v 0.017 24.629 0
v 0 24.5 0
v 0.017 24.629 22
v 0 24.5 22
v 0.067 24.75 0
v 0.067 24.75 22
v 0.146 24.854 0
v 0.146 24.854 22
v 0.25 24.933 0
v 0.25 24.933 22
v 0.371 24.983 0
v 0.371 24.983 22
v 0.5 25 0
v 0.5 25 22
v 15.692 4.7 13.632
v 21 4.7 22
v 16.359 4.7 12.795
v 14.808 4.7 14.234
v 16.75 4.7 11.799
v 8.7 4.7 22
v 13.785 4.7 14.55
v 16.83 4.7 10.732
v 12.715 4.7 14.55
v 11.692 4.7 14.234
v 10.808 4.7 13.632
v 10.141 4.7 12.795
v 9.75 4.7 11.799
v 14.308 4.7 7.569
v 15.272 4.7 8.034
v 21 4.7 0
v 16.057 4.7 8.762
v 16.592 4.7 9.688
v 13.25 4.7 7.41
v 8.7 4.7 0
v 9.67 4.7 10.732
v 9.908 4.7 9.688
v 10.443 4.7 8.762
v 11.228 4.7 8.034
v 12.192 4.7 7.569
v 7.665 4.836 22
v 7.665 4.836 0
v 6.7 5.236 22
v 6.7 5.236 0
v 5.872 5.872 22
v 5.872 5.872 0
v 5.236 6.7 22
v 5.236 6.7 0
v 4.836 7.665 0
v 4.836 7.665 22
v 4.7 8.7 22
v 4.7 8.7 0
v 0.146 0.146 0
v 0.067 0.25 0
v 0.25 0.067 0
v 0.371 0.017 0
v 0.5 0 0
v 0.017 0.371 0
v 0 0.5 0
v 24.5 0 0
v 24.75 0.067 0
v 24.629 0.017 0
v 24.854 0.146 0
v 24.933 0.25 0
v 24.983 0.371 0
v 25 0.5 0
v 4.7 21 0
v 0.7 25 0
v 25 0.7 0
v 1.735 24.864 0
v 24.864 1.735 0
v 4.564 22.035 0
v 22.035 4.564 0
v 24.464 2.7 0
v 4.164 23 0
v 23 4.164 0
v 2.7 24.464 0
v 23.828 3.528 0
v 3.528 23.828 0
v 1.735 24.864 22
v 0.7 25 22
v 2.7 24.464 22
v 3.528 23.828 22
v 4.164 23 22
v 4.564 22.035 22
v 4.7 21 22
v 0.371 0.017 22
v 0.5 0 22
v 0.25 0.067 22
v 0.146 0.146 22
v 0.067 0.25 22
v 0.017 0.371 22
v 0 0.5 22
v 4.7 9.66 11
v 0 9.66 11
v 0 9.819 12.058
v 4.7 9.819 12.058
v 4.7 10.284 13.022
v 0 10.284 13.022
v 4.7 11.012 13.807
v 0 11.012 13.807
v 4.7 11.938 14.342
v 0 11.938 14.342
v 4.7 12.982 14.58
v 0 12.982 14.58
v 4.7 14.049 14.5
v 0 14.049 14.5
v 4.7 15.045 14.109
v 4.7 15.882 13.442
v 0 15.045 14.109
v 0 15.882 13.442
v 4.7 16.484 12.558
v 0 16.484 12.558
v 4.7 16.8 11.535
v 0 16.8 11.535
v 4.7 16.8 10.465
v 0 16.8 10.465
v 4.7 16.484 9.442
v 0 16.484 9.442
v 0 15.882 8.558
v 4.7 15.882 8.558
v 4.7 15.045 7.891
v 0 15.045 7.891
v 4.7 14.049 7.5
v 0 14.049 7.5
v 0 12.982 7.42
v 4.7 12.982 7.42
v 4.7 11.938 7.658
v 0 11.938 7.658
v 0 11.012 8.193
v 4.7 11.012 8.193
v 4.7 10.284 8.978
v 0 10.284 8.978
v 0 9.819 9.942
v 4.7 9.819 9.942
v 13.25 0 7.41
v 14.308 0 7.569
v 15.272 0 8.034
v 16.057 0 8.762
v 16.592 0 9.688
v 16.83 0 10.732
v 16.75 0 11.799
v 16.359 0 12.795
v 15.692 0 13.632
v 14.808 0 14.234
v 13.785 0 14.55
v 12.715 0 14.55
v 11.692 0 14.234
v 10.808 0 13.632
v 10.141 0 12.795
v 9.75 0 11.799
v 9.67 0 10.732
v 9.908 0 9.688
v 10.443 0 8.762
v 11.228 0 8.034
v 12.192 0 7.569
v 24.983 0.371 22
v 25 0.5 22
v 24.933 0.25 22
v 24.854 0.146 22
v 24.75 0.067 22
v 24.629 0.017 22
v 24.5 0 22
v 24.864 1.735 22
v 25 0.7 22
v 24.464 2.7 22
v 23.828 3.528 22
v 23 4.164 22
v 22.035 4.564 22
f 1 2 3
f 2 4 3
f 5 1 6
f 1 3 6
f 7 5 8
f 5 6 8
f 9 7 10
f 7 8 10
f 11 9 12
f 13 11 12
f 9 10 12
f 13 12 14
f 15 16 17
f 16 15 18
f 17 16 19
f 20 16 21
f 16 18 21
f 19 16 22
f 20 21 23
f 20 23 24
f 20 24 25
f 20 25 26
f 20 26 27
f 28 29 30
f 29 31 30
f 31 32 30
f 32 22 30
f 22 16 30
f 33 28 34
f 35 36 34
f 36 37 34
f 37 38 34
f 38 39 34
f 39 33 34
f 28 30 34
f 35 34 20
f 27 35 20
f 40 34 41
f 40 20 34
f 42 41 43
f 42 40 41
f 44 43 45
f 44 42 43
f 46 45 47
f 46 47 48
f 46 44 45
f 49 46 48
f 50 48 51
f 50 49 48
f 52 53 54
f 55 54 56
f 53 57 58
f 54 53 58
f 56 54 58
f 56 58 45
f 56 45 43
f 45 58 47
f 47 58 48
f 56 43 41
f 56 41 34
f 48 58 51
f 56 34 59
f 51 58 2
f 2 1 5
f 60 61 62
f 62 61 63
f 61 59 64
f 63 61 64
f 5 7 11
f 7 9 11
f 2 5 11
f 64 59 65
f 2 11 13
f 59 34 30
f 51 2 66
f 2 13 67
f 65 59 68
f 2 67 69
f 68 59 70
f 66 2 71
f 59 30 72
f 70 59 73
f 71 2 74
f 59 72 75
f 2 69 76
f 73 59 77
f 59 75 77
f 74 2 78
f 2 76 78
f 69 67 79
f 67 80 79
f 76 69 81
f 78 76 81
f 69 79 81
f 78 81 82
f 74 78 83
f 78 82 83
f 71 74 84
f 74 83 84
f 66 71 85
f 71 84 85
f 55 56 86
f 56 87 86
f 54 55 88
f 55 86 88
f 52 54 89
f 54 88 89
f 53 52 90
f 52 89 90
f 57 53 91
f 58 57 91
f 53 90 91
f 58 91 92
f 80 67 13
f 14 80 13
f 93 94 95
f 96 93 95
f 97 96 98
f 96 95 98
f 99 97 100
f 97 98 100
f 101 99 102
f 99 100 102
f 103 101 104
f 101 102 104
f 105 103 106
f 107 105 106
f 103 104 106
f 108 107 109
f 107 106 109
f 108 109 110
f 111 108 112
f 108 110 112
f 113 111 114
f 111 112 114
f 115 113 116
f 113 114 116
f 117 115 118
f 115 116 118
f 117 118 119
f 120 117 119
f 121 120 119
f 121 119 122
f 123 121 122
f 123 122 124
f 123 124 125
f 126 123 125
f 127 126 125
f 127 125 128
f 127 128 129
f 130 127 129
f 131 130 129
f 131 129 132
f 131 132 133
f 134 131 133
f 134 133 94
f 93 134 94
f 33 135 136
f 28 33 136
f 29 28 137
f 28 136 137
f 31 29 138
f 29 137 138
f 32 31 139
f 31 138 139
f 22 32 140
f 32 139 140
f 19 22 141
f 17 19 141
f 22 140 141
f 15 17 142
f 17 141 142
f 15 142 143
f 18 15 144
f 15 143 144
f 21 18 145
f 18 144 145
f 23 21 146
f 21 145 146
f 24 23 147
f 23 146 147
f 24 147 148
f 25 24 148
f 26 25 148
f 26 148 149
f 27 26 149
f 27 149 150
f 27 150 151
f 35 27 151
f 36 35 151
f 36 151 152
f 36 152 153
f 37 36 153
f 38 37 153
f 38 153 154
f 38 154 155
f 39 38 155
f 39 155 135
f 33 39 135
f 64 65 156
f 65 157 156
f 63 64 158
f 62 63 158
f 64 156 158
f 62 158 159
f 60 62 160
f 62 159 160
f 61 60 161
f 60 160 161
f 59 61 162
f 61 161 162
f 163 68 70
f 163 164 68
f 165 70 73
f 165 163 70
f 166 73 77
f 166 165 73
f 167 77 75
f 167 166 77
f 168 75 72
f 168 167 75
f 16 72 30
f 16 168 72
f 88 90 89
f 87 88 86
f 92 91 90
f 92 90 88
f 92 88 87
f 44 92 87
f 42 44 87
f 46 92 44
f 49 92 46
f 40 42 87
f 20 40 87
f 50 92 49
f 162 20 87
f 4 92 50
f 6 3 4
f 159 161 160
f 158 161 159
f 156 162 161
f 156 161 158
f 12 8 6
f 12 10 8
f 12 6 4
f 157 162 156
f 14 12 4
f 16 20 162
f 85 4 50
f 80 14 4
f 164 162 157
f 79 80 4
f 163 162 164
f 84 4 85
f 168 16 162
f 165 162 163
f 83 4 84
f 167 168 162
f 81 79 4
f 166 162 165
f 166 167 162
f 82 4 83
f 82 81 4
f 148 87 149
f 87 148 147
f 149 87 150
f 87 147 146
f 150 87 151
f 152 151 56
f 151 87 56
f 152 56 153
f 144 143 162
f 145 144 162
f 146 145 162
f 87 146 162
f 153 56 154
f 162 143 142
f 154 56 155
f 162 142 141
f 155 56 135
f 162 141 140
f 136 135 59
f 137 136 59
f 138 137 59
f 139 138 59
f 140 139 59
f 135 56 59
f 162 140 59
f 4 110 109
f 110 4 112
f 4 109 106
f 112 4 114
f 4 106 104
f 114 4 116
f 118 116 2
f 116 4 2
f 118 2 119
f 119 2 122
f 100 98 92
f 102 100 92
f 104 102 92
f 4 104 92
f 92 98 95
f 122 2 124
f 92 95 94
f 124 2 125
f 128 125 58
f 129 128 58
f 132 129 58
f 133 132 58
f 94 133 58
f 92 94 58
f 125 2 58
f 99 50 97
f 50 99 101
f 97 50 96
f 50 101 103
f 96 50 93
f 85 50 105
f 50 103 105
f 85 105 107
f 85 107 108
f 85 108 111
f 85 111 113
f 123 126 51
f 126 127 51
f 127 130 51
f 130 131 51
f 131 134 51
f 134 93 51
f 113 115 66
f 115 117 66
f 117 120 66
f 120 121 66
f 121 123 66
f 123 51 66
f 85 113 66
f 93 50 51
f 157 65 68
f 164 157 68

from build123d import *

# Parameters (mm, degrees)
BOSS_EXTRUDE1_DEPTH = 22
SKETCH2_R           = 3.59
CUT_EXTRUDE1_DEPTH  = 42.641325627
SKETCH3_R           = 3.59
CUT_EXTRUDE2_DEPTH  = 42.641325627
FILLET1_R           = 4
FILLET2_R           = 0.5


with BuildPart() as part:
    # Sketch1 → Boss-Extrude1 (new body)
    with BuildSketch(Plane.XY):
        Polygon((0, 0), (25, 0), (25, 4.7), (4.7, 4.7), (4.7, 25), (0, 25), align=None)
    extrude(amount=BOSS_EXTRUDE1_DEPTH)

    # Sketch2 → Cut-Extrude1 (cut, through all)
    with BuildSketch(Plane.XZ):
        with Locations(Location((13.25, 11, 0), (0, 0, 270))):
            Circle(SKETCH2_R)
    extrude(amount=-CUT_EXTRUDE1_DEPTH, mode=Mode.SUBTRACT)

    # Sketch3 → Cut-Extrude2 (cut, through all)
    with BuildSketch(Plane.ZY):
        with Locations(Location((11, 13.25, 0), (0, 0, 270))):
            Circle(SKETCH3_R)
    extrude(amount=-CUT_EXTRUDE2_DEPTH, mode=Mode.SUBTRACT)

    # Fillet1
    fillet1_edges = [part.edges().sort_by_distance(p)[0] for p in [
        (4.7, 25, 11),
        (4.7, 4.7, 11),
        (25, 4.7, 11),
    ]]
    fillet(fillet1_edges, radius=FILLET1_R)

    # Fillet2
    fillet2_edges = [part.edges().sort_by_distance(p)[0] for p in [
        (0, 25, 11),
        (25, 0, 11),
        (0, 0, 11),
    ]]
    fillet(fillet2_edges, radius=FILLET2_R)


solid = part.part
